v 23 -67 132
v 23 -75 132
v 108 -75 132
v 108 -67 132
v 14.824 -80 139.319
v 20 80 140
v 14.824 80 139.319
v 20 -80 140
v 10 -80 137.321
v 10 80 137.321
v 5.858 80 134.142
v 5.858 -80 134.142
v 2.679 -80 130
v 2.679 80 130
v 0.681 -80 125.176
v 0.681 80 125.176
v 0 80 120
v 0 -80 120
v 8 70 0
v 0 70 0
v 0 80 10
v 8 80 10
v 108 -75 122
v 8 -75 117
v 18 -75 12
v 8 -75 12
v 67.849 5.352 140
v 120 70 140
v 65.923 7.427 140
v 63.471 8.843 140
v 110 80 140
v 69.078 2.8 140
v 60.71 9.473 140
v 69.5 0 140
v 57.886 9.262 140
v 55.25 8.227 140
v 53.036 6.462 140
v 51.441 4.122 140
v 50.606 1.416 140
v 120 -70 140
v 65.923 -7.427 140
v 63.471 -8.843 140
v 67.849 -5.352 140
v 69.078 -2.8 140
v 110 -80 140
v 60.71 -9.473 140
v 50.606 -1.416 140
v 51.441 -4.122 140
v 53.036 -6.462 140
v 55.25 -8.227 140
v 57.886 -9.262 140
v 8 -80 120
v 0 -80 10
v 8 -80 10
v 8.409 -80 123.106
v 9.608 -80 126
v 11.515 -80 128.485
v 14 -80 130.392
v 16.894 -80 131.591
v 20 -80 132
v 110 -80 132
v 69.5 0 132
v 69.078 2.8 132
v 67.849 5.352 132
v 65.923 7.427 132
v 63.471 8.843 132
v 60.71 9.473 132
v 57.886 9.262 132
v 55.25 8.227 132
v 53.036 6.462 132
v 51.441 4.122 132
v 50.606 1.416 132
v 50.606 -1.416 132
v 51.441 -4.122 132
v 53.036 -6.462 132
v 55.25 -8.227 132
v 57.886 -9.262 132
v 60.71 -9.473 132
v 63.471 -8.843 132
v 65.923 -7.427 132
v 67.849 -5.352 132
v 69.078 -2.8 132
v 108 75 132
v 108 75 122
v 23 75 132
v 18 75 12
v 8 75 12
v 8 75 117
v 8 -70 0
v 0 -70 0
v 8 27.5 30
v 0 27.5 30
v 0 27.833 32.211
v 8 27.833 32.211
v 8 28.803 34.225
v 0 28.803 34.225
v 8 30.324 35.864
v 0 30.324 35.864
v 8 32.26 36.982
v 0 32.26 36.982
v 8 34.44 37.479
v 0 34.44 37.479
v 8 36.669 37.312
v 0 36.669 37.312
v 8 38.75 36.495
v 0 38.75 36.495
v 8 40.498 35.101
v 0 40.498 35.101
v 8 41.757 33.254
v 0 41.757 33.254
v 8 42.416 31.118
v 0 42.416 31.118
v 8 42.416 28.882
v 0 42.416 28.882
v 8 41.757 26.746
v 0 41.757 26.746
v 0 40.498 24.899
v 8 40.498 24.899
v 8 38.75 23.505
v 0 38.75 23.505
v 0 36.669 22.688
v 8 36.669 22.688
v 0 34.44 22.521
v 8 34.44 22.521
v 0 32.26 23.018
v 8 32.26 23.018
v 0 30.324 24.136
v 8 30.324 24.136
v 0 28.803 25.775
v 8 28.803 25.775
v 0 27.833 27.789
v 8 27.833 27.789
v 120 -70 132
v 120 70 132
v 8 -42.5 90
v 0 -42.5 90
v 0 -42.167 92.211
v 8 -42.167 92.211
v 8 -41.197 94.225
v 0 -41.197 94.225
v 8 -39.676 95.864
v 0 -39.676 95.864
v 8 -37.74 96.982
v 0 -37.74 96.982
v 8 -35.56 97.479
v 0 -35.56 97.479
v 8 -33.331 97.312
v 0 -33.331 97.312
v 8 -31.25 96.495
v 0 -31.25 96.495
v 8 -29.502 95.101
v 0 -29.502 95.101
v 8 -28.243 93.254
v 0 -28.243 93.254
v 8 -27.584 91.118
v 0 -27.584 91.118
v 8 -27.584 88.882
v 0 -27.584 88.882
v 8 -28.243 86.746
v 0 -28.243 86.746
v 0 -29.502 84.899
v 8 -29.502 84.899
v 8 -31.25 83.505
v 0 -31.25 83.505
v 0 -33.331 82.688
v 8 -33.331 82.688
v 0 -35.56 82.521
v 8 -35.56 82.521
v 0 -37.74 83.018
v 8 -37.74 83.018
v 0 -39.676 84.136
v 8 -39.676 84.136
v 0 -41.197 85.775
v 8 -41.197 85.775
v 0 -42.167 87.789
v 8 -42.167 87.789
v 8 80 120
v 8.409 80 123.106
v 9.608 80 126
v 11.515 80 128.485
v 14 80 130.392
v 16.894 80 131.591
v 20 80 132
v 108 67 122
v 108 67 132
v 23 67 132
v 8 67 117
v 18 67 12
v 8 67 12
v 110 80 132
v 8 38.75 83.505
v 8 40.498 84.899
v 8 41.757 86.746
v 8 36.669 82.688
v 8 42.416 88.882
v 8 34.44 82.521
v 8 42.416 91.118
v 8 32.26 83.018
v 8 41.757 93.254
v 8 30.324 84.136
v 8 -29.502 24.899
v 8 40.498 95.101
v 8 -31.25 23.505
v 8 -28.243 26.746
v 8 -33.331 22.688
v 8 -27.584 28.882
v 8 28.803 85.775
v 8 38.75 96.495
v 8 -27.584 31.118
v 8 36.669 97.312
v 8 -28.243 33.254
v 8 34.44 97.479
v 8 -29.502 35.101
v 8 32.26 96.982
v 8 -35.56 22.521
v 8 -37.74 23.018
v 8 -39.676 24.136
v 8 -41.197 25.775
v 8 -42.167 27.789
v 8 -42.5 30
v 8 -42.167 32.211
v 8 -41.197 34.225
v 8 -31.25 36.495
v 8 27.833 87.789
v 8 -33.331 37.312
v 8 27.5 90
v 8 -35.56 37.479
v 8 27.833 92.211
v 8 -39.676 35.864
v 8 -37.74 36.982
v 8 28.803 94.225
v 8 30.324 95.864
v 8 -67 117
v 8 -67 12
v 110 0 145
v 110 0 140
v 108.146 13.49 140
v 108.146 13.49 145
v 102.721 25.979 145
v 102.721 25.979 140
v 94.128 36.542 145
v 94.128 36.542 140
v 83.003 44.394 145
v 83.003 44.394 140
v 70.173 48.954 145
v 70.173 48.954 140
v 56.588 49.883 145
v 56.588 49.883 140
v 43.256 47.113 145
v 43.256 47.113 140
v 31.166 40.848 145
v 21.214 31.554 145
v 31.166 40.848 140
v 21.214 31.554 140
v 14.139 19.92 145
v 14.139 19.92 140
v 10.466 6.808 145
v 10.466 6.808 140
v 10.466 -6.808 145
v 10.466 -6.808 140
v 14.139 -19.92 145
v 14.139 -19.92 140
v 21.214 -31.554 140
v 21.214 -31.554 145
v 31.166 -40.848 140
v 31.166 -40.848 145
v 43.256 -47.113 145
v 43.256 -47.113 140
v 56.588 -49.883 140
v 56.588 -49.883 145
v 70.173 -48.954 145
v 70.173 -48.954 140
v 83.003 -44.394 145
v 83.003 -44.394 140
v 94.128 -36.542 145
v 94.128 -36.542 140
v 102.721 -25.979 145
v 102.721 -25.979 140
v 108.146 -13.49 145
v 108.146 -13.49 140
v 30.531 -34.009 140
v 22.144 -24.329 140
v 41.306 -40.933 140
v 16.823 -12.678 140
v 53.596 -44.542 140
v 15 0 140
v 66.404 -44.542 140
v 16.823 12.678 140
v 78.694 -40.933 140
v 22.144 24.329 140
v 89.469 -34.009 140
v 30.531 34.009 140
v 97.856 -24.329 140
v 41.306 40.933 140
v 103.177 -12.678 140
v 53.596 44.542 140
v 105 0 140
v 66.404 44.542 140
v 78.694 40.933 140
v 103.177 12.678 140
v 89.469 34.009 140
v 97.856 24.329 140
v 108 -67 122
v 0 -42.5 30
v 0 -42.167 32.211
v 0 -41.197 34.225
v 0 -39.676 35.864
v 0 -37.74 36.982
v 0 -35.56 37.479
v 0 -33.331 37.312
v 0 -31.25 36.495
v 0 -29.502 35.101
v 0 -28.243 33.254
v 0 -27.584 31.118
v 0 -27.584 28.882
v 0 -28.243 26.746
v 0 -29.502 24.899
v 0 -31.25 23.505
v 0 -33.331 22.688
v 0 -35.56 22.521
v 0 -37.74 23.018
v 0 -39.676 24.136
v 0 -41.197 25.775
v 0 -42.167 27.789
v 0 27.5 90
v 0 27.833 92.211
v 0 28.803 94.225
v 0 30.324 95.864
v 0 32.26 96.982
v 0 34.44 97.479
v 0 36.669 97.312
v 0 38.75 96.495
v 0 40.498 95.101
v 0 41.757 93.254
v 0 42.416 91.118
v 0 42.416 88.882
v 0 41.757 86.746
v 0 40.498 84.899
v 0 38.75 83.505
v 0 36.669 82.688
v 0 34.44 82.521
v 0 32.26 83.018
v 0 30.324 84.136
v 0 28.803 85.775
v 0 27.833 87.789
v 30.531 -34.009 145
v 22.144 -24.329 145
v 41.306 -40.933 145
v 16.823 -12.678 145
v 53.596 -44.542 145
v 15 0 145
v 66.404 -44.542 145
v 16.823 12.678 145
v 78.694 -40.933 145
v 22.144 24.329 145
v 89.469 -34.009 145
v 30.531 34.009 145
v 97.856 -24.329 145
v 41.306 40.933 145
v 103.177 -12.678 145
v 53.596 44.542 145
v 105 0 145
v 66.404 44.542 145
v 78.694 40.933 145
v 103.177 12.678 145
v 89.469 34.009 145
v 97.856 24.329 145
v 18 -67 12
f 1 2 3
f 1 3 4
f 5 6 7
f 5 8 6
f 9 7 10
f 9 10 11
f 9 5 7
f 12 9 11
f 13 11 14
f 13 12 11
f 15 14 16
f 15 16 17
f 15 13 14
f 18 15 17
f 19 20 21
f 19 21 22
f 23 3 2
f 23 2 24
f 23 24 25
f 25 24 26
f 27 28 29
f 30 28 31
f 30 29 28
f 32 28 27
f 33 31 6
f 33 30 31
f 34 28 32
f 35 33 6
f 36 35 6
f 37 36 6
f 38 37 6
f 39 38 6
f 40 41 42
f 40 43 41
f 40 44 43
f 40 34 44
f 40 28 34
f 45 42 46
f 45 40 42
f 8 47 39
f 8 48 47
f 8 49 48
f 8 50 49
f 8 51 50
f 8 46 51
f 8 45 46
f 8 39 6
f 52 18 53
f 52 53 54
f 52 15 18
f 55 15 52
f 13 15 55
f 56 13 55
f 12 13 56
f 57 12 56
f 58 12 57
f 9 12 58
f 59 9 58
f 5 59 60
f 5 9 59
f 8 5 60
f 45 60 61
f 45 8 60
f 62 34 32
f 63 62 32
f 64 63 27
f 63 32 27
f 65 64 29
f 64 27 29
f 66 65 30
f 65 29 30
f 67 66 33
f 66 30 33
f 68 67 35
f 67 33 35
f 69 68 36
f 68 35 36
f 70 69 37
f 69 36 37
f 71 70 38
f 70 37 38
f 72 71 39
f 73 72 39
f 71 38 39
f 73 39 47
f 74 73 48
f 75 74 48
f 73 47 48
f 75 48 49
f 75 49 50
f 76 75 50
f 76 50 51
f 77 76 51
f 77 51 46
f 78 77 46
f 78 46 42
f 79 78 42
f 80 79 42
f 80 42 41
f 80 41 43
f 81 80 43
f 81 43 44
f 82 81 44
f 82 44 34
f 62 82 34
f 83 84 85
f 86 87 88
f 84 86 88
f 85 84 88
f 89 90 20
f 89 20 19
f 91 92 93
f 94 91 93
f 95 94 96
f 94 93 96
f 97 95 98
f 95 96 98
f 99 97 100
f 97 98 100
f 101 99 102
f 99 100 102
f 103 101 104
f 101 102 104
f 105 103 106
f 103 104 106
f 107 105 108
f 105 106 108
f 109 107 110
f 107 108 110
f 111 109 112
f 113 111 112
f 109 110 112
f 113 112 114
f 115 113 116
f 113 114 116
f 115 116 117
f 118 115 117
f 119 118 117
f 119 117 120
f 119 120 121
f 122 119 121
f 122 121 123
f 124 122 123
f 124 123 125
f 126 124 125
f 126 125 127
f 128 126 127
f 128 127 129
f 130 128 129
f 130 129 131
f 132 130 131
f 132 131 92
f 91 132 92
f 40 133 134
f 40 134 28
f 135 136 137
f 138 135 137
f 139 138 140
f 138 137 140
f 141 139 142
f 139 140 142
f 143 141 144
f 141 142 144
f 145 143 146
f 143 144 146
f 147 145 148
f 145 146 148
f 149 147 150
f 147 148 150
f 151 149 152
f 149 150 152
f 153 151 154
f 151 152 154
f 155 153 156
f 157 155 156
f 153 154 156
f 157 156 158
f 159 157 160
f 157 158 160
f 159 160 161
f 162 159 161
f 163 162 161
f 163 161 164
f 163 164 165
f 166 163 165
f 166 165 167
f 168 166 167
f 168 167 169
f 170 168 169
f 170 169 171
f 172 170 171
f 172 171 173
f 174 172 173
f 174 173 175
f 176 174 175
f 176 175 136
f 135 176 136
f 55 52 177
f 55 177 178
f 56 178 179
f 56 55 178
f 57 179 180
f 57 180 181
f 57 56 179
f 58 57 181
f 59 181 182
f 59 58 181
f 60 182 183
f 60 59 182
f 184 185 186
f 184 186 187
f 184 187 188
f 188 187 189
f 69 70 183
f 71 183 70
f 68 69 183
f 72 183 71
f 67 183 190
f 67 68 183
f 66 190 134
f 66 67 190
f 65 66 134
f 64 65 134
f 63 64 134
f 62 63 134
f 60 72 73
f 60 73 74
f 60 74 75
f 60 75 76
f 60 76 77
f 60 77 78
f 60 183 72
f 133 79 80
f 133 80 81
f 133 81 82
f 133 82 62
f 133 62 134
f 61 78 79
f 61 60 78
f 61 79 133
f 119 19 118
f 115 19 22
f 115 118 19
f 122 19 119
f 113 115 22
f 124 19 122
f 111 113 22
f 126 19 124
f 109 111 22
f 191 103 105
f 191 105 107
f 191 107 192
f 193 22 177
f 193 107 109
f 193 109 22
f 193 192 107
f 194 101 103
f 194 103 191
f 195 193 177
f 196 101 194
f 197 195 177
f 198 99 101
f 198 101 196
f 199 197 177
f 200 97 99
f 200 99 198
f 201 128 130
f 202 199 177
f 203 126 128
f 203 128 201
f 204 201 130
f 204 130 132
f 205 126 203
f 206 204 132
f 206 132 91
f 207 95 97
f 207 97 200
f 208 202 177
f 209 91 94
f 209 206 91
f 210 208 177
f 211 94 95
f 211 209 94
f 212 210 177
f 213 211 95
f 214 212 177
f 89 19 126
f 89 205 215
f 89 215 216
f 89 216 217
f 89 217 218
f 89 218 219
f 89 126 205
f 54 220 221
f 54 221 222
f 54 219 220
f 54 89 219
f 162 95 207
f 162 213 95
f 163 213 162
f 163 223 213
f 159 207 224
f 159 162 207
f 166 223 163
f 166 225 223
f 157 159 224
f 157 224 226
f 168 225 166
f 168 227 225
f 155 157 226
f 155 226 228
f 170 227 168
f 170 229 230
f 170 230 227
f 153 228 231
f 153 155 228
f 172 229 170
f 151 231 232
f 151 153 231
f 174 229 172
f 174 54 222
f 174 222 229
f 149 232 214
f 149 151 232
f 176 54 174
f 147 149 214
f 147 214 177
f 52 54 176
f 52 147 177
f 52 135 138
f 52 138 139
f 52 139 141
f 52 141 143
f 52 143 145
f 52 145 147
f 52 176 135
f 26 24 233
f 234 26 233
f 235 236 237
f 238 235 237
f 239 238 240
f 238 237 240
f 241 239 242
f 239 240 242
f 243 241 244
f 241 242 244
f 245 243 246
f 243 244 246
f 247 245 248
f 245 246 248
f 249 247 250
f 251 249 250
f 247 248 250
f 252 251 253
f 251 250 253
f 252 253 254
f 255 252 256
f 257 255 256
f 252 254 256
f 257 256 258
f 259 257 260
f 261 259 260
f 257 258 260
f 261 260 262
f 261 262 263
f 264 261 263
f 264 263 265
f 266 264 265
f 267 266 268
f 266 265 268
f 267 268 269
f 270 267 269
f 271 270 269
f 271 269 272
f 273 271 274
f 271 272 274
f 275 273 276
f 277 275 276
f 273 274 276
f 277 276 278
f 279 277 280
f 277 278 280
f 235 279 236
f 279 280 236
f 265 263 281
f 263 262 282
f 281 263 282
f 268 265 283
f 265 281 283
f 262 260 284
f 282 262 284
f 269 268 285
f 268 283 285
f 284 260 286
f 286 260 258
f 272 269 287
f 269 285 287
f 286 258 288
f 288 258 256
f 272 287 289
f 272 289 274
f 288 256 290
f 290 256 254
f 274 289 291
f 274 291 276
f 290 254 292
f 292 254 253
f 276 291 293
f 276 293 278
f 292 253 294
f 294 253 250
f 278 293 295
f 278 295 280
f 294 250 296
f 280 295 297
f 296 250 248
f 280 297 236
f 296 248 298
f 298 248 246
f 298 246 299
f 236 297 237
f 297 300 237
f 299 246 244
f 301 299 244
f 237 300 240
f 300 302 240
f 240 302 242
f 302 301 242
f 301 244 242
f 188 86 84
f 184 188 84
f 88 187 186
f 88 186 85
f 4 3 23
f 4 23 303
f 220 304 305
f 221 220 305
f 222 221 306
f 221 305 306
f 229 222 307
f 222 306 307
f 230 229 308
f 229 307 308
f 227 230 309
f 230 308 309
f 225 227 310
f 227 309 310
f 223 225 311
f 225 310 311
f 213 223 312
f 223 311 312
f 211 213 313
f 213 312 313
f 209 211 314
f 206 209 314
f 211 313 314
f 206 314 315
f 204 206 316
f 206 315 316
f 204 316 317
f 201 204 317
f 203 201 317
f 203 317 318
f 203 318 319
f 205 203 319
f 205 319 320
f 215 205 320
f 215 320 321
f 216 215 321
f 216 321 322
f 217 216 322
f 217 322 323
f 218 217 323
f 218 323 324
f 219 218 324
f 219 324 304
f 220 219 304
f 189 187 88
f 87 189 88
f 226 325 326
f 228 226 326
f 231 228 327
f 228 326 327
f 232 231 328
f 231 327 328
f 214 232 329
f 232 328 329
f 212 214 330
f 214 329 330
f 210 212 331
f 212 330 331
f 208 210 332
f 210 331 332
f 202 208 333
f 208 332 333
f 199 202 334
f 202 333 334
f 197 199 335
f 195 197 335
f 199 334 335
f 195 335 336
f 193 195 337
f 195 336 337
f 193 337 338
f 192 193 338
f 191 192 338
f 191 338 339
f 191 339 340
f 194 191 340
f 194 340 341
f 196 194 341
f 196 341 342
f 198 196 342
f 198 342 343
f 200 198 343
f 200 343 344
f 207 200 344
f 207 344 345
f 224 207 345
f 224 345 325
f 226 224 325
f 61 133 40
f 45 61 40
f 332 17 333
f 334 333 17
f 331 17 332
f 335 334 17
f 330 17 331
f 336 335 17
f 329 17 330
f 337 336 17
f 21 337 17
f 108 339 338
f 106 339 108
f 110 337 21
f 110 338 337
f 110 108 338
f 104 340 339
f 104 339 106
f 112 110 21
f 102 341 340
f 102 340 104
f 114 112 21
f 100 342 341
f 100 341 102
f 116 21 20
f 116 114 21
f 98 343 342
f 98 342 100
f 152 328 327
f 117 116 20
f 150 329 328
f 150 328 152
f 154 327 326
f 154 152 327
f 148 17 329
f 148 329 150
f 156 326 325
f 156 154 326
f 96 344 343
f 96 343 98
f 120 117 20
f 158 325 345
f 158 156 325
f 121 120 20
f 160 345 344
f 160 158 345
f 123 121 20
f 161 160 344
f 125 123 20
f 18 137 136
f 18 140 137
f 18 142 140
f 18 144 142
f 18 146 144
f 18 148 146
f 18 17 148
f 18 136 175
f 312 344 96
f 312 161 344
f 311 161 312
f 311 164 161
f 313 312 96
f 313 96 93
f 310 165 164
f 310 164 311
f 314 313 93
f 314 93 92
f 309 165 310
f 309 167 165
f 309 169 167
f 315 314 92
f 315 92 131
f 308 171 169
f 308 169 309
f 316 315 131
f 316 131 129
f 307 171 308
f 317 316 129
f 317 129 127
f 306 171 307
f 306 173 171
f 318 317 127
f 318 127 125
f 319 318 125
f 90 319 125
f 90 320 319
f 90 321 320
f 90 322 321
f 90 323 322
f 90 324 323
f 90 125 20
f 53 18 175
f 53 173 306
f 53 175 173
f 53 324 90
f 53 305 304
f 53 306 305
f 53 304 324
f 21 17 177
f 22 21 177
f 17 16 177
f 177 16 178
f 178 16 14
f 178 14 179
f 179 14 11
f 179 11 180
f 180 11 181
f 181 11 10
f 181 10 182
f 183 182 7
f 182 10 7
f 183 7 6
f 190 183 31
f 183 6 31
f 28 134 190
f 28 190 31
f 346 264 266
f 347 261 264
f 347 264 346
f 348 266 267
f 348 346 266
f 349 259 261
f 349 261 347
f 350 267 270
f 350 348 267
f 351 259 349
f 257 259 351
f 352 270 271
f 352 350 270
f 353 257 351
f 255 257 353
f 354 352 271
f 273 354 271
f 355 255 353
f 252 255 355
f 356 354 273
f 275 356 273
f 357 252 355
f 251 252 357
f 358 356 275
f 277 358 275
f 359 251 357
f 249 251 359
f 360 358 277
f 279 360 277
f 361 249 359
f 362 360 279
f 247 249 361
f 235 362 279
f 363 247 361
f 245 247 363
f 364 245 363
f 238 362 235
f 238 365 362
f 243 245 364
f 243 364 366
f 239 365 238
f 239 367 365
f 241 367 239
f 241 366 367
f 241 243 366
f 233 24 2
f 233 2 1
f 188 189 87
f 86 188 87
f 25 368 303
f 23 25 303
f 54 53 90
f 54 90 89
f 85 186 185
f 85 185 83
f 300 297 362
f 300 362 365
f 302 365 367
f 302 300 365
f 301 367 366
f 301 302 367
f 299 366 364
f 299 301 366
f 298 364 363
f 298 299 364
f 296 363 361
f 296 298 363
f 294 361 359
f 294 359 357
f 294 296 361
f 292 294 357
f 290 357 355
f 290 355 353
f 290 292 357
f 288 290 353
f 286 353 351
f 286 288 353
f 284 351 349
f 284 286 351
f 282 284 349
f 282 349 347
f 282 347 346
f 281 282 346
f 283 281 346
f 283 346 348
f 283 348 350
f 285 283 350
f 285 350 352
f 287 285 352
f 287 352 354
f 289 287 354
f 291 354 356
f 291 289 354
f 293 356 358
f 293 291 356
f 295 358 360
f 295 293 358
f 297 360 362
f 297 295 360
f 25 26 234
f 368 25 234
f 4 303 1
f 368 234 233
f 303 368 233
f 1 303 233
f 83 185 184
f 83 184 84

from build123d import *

# Parameters (mm, degrees)
F1_DEPTH  = 80
F2_W      = 8
F2_H      = 108
F2_H_2    = 12
F3_DEPTH  = 100
F4_SIZE   = 15
F4_2_SIZE = 15
F6_DEPTH  = 155.001
F7_R      = 9.5
F8_DEPTH  = 140.001
F7_R_2    = 50
F7_R_3    = 45
F9_DEPTH  = 5
F10_SIZE  = 10
F11_R     = 7.5
F12_DEPTH = 25
F13_DEPTH = 120.001


with BuildPart() as f1:
    # F0 (on Front) → F1 (new body, symmetric)
    with BuildSketch(Plane.XZ):
        with BuildLine():
            Line((0, 120), (0, 0))
            Line((0, 0), (8, 0))
            Line((8, 0), (8, 120))
            ThreePointArc((8, 120), (11.5147186258, 128.4852813742), (20, 132))
            Line((20, 132), (120, 132))
            Line((120, 132), (120, 140))
            Line((120, 140), (20, 140))
            ThreePointArc((20, 140), (5.8578643763, 134.1421356237), (0, 120))
        make_face()
    extrude(amount=F1_DEPTH, both=True)

    # F7 (on face) → F8 (cut, through all)
    with BuildSketch(Plane.XY.offset(140)):
        with Locations((60, 0)):
            Circle(F7_R)
    extrude(amount=-F8_DEPTH, mode=Mode.SUBTRACT)

    # F10
    f10_edges = [f1.edges().sort_by_distance(p)[0] for p in [
        (120, -80, 136),
        (4, -80, 0),
        (120, 80, 136),
        (4, 80, 0),
    ]]
    chamfer(f10_edges, length=F10_SIZE)

    # F11 (on face) → F12 (cut)
    with BuildSketch(Plane(origin=(0, 0, 0), x_dir=(0, -1, 0), z_dir=(-1, 0, 0))):
        with Locations((-35, 90)):
            Circle(F11_R)
        with Locations((35, 90)):
            Circle(F11_R)
        with Locations((35, 30)):
            Circle(F11_R)
        with Locations((-35, 30)):
            Circle(F11_R)
    extrude(amount=-F12_DEPTH, mode=Mode.SUBTRACT)

    # F11 (on face) → F13 (cut, through all)
    with BuildSketch(Plane(origin=(0, 0, 0), x_dir=(0, -1, 0), z_dir=(-1, 0, 0))):
        with Locations((-35, 90)):
            Circle(F11_R)
        with Locations((35, 90)):
            Circle(F11_R)
    extrude(amount=-F13_DEPTH, mode=Mode.SUBTRACT)


with BuildPart() as f3:
    # F2 (on face) → F3 (new body)
    with BuildSketch(Plane.YZ.offset(8)):
        with Locations((-71, 66)):
            Rectangle(F2_W, F2_H)
        with Locations((-71, 126)):
            Rectangle(F2_W, F2_H_2)
    extrude(amount=F3_DEPTH)

    # F4#2
    f4_2_edges = [f3.edges().sort_by_distance(p)[0] for p in [
        (8, -71, 132),
    ]]
    chamfer(f4_2_edges, length=F4_2_SIZE)


with BuildPart() as f3b:
    # F2 (on face) → F3, piece 2 (new body)
    with BuildSketch(Plane.YZ.offset(8)):
        with Locations((71, 66)):
            Rectangle(F2_W, F2_H)
        with Locations((71, 126)):
            Rectangle(F2_W, F2_H_2)
    extrude(amount=F3_DEPTH)

    # F4
    f4_edges = [f3b.edges().sort_by_distance(p)[0] for p in [
        (8, 71, 132),
    ]]
    chamfer(f4_edges, length=F4_SIZE)


with BuildPart() as f6_tool:
    # F5 (on face) → F6 (new body, through all)
    with BuildSketch(Plane(origin=(0, 75, 0), x_dir=(-1, 0, 0), z_dir=(0, 1, 0))):
        Polygon((-18, 12), (-108, 122), (-108, 12), align=None)
    extrude(amount=-F6_DEPTH)


with BuildPart() as f3_1:
    add(f3.part)

    # F6: cut by f6_tool
    add(f6_tool.part, mode=Mode.SUBTRACT)


with BuildPart() as f3b_1:
    add(f3b.part)

    # F6: cut by f6_tool
    add(f6_tool.part, mode=Mode.SUBTRACT)


with BuildPart() as f9:
    # F7 (on face) → F9 (new body)
    with BuildSketch(Plane.XY.offset(140)):
        with Locations((60, 0)):
            Circle(F7_R_2)
        with Locations((60, 0)):
            Circle(F7_R_3, mode=Mode.SUBTRACT)
    extrude(amount=F9_DEPTH)


solid = Compound([f1.part, f3_1.part, f3b_1.part, f9.part])
